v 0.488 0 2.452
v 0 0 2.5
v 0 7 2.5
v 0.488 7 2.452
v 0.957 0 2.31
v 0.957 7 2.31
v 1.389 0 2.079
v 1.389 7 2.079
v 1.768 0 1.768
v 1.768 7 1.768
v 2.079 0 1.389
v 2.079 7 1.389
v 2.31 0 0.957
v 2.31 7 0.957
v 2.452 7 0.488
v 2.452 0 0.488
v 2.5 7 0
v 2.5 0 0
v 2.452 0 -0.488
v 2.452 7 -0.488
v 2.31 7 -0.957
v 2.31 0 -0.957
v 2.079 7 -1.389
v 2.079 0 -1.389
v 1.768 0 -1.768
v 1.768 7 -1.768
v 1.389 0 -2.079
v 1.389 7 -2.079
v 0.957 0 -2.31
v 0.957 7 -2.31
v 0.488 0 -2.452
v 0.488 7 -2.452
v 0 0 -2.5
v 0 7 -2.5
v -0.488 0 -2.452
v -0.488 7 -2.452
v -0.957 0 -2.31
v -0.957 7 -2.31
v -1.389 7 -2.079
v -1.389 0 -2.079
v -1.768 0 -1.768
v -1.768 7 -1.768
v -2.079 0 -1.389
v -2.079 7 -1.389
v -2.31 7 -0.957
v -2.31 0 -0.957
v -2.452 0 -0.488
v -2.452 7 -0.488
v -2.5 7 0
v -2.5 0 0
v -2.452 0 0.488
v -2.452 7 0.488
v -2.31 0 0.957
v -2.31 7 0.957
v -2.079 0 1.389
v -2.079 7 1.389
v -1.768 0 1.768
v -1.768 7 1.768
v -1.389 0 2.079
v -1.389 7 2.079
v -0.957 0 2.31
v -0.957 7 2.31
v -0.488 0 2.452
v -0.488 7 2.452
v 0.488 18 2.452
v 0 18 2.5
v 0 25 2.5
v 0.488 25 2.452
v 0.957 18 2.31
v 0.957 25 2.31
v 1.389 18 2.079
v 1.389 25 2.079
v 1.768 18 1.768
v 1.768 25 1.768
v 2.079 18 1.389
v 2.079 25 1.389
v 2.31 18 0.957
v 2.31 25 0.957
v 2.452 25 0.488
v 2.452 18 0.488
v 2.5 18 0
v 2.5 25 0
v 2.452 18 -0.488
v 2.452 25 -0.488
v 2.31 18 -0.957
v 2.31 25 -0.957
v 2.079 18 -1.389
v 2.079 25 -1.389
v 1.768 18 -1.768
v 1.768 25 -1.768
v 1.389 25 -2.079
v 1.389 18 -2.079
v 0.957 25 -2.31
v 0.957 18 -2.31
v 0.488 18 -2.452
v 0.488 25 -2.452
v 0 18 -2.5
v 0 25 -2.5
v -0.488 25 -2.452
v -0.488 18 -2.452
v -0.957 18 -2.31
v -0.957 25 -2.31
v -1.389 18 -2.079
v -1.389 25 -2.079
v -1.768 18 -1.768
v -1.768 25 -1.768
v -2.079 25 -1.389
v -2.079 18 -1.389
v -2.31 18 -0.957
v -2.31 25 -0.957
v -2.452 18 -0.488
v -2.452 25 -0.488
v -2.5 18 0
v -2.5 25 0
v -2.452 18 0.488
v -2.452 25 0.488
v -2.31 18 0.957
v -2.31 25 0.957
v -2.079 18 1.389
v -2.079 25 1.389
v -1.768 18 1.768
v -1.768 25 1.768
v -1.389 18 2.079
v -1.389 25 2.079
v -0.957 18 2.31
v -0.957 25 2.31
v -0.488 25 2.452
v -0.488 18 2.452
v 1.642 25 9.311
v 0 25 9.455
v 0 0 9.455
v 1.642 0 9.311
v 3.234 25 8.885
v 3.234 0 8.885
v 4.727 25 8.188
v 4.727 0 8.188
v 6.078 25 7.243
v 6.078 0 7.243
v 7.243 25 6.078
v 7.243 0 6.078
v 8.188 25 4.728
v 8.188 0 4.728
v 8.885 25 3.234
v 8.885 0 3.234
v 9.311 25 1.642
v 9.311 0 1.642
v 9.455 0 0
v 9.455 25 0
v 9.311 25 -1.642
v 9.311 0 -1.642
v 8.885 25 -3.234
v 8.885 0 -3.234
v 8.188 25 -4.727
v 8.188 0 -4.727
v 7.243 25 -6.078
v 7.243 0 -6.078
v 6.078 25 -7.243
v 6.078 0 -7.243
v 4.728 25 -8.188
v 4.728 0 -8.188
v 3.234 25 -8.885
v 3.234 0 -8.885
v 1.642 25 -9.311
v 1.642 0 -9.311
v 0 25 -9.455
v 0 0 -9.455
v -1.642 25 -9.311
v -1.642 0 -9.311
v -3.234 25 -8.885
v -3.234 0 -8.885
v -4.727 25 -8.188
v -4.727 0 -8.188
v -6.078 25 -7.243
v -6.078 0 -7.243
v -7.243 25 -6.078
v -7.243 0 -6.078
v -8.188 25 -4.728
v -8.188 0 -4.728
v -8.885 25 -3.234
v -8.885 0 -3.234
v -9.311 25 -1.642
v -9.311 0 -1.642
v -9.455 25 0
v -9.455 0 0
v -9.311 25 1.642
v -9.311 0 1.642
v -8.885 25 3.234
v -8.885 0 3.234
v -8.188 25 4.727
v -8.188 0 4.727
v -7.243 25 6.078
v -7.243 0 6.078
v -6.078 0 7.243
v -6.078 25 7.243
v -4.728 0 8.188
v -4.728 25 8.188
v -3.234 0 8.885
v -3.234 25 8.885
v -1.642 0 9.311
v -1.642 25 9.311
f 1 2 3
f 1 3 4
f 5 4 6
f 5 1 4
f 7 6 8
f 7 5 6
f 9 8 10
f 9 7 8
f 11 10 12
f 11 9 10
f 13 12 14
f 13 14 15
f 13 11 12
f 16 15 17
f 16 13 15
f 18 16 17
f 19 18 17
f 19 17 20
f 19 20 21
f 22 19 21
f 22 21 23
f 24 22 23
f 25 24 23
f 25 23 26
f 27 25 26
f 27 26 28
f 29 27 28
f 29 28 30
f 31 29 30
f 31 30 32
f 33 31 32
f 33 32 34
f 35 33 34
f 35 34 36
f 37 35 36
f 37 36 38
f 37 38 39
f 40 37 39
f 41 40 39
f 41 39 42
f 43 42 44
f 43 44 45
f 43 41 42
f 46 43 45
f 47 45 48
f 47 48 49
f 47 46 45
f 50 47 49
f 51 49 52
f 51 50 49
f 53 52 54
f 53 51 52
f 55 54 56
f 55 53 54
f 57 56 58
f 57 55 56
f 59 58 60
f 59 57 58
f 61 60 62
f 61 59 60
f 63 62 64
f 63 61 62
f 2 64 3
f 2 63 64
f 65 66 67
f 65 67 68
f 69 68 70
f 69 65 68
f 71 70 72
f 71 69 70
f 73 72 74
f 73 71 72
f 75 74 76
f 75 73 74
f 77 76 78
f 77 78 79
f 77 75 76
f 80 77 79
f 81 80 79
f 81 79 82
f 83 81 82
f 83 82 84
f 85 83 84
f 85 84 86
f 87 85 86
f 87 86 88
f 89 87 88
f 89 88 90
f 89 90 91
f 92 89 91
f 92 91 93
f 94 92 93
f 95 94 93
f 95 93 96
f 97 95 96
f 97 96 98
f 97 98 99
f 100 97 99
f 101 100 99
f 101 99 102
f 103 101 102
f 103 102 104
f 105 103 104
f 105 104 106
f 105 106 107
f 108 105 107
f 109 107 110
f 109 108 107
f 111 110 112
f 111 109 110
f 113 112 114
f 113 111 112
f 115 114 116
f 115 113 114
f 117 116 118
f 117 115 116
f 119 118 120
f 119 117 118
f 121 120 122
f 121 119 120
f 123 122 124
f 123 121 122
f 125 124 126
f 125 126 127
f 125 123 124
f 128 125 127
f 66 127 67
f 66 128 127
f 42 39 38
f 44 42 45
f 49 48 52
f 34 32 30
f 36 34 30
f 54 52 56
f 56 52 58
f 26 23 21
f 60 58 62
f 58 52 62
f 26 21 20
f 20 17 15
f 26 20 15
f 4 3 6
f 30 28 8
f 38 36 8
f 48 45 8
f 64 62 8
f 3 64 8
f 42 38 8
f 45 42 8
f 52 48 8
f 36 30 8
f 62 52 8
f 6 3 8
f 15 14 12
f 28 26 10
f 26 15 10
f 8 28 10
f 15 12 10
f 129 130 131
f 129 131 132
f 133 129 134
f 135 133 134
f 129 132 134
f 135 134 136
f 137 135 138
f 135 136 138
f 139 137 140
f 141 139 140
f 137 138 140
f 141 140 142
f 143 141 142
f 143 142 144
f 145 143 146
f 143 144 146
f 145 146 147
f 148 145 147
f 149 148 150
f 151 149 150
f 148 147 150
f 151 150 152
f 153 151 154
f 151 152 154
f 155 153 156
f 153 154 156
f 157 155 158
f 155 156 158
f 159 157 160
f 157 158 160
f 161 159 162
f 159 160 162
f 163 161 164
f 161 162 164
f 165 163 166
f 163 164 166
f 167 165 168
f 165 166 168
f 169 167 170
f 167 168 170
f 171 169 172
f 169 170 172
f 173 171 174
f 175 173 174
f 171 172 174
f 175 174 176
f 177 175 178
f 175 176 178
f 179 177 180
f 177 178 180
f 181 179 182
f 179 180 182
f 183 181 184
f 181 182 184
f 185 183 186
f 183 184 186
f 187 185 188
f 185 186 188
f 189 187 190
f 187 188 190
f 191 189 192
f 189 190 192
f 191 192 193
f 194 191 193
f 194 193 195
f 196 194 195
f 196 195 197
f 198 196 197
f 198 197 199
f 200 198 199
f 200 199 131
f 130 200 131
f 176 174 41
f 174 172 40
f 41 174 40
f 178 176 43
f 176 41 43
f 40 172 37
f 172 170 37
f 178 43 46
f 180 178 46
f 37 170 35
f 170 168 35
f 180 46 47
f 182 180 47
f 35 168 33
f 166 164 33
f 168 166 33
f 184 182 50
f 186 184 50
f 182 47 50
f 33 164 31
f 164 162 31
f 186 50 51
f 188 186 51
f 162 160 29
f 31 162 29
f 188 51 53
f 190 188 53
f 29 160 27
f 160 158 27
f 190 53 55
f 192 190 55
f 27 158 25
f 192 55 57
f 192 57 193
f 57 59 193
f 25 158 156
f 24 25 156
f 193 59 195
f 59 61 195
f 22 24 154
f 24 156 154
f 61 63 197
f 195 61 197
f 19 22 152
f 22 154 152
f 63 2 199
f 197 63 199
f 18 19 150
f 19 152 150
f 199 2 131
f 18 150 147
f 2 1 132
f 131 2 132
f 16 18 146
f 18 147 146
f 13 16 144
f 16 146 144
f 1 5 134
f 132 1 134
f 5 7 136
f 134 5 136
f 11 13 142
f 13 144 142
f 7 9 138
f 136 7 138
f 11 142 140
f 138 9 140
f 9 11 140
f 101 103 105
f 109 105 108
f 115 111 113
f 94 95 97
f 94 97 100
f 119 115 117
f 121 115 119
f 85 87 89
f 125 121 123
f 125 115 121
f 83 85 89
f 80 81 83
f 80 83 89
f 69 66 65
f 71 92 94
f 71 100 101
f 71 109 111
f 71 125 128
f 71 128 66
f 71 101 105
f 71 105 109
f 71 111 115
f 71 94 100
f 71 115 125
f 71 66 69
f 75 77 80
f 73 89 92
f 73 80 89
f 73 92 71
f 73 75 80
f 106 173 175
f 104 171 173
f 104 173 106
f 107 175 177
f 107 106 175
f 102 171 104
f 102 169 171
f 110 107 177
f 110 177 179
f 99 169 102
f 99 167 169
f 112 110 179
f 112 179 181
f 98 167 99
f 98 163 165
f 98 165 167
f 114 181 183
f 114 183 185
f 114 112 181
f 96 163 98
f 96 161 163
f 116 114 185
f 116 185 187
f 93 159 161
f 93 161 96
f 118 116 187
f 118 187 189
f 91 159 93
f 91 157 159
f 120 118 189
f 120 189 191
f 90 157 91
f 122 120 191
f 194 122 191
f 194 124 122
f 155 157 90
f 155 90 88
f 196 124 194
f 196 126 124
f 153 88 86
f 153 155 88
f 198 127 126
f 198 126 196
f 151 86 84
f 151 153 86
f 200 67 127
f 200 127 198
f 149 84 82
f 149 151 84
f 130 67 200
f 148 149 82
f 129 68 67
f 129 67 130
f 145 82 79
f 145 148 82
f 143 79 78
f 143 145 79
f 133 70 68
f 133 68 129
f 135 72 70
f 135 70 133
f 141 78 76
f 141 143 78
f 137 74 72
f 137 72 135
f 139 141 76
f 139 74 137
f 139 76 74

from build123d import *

# Parameters (mm, degrees)
SKETCH1_R           = 9.455
SKETCH1_R_2         = 2.5
BOSS_EXTRUDE1_DEPTH = 25
BOSS_EXTRUDE2_START = -18
SKETCH2_R           = 2.5
BOSS_EXTRUDE2_DEPTH = 11


with BuildPart() as part:
    # Sketch1 → Boss-Extrude1 (new body)
    with BuildSketch(Plane(origin=(0, 0, 0), x_dir=(1, 0, 0), z_dir=(0, 1, 0))):
        with Locations(Location((0, 0, 0), (0, 0, 270))):
            Circle(SKETCH1_R)
        with Locations(Location((0, 0, 0), (0, 0, 270))):
            Circle(SKETCH1_R_2, mode=Mode.SUBTRACT)
    extrude(amount=BOSS_EXTRUDE1_DEPTH)

    # Sketch2 → Boss-Extrude2 (add)
    with BuildSketch(Plane(origin=(0, 25, 0), x_dir=(1, 0, 0), z_dir=(0, 1, 0)).offset(BOSS_EXTRUDE2_START)):
        with Locations(Location((0, 0, 0), (0, 0, 270))):
            Circle(SKETCH2_R)
    extrude(amount=BOSS_EXTRUDE2_DEPTH)


solid = part.part
